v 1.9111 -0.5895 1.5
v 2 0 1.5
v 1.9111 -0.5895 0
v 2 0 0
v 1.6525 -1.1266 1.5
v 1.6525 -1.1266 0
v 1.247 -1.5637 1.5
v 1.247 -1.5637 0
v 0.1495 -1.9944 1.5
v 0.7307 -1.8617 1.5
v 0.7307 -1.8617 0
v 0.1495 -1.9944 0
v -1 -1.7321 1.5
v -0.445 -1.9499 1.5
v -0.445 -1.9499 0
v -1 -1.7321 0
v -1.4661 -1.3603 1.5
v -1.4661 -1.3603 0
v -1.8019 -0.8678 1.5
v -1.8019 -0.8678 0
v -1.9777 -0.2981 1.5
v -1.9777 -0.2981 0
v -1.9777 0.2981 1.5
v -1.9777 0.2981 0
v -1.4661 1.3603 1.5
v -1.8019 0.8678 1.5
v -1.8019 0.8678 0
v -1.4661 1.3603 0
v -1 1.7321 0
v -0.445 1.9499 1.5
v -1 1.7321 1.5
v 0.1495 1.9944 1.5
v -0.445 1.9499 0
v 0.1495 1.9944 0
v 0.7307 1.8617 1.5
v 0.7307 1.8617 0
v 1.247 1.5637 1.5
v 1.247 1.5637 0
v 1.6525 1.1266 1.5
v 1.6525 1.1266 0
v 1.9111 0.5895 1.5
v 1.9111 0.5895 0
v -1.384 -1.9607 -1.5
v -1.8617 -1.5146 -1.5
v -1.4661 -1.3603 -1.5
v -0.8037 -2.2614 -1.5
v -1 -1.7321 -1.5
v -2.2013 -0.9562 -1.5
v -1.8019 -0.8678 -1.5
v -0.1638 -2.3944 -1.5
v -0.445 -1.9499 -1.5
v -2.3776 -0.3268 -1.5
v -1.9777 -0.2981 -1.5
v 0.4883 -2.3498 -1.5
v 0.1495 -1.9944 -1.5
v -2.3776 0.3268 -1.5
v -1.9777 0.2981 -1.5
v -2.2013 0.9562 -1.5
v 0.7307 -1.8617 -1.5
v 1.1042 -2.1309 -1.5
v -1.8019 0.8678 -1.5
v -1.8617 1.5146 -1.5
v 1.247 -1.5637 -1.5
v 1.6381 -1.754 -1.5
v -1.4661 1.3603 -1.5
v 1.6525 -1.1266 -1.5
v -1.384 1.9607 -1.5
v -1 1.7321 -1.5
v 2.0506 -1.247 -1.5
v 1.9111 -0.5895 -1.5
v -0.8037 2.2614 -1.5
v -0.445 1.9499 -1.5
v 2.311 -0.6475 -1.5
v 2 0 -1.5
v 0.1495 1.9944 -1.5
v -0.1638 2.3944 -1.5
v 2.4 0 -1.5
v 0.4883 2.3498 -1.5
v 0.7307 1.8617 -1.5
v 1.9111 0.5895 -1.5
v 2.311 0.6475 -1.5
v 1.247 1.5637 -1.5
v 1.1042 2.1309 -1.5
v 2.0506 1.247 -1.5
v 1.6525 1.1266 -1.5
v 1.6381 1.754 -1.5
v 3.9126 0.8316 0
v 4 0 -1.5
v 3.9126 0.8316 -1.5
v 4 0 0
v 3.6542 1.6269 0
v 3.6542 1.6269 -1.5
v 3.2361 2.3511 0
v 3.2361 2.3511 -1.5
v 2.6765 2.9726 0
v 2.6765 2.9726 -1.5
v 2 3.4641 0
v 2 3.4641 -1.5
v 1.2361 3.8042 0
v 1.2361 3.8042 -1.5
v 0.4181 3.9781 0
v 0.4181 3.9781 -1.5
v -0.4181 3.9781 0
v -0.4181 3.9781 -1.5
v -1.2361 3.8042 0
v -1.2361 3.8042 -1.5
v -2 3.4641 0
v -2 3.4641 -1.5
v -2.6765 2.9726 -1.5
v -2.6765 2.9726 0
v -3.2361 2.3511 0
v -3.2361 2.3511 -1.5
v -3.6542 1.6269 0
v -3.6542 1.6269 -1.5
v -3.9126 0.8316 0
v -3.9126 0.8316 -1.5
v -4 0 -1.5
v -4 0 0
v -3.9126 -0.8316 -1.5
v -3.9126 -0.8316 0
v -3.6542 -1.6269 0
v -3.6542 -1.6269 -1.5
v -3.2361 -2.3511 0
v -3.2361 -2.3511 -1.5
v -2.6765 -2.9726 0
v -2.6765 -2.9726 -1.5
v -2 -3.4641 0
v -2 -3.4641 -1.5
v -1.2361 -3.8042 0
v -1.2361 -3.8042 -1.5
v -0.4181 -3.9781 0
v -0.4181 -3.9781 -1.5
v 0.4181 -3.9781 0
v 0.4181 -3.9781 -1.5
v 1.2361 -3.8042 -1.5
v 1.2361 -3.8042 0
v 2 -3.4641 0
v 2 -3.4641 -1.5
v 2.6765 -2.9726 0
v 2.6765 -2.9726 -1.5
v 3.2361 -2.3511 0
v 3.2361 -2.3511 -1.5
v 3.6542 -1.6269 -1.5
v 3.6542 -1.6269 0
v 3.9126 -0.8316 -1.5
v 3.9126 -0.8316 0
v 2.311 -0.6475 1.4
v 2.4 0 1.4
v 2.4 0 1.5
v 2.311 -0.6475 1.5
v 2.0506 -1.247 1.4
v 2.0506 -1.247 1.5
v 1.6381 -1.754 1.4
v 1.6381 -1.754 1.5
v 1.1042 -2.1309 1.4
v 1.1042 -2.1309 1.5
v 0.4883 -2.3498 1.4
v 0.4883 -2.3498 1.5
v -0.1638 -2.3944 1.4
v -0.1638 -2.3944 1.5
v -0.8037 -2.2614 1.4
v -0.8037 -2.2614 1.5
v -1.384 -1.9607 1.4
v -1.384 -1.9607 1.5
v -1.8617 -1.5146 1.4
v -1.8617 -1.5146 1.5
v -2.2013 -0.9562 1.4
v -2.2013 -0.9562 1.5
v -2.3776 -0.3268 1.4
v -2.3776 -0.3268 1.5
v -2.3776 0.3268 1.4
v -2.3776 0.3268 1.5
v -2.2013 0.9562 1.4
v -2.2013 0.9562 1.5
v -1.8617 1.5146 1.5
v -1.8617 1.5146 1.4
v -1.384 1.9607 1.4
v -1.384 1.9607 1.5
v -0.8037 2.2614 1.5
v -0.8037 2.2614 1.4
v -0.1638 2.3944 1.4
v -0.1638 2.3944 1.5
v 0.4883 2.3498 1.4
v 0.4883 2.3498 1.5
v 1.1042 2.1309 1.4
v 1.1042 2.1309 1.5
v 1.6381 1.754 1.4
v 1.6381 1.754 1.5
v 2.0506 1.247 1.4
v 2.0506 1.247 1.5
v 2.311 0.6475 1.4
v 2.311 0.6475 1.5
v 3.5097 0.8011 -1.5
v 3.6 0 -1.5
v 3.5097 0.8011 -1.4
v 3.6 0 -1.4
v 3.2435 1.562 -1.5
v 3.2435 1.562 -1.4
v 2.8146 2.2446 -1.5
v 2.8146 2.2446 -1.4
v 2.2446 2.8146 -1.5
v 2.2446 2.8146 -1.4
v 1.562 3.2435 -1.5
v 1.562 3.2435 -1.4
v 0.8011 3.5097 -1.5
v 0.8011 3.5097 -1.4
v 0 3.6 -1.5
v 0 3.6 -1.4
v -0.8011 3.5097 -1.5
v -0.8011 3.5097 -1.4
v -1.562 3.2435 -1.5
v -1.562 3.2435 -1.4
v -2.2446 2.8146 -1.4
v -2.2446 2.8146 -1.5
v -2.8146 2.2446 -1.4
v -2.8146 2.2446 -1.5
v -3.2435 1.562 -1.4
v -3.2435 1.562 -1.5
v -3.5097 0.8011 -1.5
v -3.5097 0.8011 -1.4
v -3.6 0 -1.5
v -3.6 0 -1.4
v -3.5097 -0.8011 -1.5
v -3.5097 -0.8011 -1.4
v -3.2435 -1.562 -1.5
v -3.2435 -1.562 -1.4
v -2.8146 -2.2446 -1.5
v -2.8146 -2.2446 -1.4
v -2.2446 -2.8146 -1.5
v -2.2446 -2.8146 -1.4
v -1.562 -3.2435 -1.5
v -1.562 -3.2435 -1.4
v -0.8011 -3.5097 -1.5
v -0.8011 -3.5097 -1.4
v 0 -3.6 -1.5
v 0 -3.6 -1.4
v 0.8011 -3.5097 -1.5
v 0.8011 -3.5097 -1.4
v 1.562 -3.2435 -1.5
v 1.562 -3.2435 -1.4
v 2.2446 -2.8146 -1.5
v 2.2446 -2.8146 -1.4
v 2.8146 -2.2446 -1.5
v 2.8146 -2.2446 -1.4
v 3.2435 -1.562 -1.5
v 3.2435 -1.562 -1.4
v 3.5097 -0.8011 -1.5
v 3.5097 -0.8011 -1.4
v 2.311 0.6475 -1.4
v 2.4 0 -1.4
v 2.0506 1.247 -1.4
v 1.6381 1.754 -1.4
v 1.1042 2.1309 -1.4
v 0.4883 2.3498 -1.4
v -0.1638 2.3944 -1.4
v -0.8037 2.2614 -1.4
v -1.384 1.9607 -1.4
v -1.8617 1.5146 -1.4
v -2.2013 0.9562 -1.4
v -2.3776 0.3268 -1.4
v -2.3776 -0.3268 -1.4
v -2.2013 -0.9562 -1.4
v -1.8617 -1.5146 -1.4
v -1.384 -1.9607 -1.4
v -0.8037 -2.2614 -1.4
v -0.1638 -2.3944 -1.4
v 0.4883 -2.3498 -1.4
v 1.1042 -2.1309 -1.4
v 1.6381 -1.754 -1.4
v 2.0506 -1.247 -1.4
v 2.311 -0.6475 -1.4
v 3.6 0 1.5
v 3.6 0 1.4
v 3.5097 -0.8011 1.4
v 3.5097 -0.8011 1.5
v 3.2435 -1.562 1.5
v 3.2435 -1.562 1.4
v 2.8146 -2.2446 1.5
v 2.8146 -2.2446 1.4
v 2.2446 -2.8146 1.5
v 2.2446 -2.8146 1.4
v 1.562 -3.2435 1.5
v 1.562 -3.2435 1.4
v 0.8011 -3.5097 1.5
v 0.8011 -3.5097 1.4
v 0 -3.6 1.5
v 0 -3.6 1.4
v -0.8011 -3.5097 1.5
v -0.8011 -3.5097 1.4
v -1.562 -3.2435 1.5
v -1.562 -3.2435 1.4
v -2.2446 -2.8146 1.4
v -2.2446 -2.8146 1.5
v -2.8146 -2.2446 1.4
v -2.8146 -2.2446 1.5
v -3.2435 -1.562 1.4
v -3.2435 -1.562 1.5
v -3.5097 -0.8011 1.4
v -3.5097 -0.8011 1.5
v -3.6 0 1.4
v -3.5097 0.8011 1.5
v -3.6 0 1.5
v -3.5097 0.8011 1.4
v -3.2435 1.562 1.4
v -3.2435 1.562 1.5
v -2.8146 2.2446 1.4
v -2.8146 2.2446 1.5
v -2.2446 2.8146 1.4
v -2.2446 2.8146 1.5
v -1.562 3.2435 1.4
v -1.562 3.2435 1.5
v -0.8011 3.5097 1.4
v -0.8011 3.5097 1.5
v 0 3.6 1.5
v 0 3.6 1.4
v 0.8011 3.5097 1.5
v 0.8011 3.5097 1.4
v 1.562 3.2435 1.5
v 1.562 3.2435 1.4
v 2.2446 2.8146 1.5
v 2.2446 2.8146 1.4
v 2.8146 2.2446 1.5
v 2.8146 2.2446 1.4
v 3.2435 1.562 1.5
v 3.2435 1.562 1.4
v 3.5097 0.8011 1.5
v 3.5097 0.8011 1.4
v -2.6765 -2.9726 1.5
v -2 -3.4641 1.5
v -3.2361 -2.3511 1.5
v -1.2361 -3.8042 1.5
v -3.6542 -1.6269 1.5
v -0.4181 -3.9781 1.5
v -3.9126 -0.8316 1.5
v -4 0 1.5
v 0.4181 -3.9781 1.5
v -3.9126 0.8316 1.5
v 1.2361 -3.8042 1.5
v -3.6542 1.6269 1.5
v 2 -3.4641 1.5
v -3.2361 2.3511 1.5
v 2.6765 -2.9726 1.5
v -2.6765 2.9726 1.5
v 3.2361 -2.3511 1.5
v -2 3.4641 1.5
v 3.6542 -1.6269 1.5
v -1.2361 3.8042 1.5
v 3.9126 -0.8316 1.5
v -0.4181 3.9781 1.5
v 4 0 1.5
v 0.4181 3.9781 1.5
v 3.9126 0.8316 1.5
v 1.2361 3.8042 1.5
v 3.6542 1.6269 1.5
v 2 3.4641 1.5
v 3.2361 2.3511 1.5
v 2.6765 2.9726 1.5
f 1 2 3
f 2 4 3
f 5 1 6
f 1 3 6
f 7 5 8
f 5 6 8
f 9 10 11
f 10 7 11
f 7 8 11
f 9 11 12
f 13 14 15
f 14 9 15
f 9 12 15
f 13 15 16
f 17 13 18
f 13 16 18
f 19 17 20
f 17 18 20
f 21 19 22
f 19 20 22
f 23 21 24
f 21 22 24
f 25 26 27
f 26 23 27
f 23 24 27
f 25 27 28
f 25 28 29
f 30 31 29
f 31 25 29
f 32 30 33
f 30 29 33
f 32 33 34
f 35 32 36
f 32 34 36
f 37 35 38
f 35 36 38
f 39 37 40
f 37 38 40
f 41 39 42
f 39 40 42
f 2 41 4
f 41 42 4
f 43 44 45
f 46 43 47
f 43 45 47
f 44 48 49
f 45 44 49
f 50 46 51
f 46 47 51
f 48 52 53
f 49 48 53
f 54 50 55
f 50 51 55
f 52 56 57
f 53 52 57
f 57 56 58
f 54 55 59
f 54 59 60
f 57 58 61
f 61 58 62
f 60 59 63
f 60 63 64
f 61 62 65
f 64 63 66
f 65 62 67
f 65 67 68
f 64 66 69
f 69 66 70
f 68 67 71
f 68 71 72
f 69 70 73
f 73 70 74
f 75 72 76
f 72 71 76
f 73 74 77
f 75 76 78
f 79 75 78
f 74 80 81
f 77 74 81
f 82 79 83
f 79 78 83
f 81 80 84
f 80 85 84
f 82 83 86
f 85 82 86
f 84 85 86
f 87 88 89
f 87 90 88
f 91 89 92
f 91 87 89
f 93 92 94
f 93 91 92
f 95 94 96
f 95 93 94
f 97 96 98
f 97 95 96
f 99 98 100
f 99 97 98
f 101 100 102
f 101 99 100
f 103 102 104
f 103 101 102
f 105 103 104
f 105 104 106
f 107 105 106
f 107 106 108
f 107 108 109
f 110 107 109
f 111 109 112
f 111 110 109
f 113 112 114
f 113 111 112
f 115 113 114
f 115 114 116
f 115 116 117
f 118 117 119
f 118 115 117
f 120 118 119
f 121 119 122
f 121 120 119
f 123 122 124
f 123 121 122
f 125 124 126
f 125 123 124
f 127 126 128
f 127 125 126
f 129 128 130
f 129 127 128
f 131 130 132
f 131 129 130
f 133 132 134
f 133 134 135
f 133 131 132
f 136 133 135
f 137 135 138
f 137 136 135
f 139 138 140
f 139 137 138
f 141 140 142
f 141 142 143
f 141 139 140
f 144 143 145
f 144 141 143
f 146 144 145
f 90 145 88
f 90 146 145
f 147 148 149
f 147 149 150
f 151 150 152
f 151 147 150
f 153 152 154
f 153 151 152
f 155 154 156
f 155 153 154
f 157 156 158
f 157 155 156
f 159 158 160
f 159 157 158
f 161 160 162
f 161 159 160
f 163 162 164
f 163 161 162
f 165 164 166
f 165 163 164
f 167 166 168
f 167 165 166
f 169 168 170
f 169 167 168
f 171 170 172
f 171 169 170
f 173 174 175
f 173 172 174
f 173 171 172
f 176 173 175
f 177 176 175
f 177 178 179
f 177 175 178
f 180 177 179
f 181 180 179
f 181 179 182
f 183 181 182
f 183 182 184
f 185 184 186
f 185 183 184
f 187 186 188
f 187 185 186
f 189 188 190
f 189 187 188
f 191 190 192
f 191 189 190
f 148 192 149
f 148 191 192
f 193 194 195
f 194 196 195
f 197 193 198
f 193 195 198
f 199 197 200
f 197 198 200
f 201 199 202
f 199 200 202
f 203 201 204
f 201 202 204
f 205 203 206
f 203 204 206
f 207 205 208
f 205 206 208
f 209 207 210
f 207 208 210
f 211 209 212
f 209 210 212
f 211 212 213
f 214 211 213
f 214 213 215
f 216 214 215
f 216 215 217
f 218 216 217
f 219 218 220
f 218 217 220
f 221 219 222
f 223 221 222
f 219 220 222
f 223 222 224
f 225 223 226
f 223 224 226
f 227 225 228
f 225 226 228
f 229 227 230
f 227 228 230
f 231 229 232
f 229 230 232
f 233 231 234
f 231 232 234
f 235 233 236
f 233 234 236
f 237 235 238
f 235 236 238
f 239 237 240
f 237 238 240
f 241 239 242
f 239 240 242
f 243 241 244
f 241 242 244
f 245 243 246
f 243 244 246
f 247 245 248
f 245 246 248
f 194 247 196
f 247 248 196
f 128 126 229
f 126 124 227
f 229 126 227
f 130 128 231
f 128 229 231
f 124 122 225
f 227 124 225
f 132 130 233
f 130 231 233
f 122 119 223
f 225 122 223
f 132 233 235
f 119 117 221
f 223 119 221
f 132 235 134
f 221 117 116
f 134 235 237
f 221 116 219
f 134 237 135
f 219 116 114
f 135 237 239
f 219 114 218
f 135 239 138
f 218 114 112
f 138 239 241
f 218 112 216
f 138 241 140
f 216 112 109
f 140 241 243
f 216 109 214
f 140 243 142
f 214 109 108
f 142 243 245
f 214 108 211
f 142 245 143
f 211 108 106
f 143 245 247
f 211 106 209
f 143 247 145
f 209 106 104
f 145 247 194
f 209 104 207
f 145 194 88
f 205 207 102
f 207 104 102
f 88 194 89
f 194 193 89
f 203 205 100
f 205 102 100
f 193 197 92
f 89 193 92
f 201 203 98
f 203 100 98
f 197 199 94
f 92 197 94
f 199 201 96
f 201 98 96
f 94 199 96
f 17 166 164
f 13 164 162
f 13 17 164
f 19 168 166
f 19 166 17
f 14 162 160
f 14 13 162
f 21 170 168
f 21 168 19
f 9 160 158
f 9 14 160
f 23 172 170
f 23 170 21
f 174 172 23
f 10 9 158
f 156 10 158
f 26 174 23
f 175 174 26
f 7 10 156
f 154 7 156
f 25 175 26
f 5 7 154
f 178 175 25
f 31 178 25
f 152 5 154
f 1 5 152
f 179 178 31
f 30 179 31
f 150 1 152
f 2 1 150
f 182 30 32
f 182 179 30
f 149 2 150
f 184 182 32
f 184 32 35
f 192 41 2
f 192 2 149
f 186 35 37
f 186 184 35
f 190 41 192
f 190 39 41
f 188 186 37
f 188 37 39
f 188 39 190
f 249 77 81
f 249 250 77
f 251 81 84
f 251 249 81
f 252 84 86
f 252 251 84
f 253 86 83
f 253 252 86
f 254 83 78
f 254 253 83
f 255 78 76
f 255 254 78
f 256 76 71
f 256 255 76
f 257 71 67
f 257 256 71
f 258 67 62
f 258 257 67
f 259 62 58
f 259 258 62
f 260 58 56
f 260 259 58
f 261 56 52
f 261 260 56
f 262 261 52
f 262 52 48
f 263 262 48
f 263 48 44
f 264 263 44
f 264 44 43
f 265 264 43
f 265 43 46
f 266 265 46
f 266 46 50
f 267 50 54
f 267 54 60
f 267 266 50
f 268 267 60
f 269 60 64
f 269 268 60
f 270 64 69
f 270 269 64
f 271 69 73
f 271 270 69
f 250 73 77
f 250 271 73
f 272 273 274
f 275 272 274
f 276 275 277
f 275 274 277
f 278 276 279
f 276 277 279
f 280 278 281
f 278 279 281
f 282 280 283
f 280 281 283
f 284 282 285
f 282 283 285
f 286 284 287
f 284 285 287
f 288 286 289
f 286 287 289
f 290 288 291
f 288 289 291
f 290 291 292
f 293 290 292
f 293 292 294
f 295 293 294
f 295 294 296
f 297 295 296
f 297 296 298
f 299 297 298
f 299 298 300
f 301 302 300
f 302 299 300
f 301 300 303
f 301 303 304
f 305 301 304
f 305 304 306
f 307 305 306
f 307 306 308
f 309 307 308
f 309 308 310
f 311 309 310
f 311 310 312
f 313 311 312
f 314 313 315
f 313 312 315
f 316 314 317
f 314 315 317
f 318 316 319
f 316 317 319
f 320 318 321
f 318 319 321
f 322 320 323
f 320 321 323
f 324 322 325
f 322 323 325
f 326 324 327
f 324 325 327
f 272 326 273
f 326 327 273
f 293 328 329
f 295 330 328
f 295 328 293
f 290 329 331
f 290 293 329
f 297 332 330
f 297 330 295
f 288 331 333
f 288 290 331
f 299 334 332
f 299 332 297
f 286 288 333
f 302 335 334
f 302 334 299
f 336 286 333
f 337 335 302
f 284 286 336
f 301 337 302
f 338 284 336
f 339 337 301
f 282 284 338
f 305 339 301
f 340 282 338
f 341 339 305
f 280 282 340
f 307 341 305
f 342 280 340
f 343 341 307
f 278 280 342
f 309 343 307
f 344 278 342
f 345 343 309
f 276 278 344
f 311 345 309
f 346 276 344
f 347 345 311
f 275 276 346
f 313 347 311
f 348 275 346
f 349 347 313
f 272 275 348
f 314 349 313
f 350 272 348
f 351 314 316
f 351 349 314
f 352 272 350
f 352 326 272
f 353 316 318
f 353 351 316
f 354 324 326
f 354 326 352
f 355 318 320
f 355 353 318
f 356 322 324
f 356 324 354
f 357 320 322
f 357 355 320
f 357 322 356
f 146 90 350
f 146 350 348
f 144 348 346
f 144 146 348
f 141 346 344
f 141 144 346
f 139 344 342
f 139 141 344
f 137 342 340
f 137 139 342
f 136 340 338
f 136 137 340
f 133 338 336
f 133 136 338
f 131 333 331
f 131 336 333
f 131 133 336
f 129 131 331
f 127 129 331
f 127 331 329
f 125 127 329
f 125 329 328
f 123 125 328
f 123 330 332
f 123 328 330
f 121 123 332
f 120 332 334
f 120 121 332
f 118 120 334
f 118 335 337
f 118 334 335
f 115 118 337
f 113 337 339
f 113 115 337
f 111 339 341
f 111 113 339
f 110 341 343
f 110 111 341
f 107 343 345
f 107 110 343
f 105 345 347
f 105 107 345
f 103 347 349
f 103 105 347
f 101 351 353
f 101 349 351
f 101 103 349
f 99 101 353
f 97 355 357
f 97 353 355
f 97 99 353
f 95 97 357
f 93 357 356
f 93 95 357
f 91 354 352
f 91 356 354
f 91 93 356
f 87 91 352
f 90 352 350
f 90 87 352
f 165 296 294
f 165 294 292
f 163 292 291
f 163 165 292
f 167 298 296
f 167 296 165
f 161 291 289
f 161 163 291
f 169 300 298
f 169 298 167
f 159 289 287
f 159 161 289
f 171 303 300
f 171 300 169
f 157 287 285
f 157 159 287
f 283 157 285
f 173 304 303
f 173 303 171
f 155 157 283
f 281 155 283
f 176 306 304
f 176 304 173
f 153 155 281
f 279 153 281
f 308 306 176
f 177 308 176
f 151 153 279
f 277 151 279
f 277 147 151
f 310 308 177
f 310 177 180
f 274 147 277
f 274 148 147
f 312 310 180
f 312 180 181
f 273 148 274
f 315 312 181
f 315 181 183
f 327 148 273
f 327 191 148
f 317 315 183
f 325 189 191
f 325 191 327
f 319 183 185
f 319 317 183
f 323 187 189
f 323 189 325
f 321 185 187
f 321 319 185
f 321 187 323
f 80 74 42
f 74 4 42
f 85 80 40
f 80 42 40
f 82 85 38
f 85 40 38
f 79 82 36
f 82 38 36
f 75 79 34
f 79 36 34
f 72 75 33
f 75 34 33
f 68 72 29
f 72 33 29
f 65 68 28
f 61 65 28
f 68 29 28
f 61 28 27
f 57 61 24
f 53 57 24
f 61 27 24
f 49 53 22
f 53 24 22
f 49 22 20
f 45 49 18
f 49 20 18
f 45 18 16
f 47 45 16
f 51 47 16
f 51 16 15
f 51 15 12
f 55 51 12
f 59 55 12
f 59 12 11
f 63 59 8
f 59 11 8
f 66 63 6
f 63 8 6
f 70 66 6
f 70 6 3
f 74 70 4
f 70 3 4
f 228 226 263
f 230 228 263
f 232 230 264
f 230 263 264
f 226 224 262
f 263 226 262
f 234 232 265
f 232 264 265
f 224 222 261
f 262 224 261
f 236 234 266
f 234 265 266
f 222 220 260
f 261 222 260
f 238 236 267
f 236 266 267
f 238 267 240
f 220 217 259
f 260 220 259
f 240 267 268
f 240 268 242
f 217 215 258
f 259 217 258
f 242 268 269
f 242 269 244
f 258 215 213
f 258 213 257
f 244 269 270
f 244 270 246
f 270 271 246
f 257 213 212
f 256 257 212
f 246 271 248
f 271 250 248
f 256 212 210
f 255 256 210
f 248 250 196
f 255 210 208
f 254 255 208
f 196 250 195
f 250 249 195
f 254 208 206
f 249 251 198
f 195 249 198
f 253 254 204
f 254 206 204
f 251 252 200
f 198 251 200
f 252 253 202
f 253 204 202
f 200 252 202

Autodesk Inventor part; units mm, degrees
ref_plane "YZ Plane" through (0, 0, 0) normal (1, 0, 0) x (0, 1, 0)
ref_plane "XZ Plane" through (0, 0, 0) normal (0, 1, 0) x (-1, 0, 0)
ref_plane "XY Plane" through (0, 0, 0) normal (0, 0, 1) x (1, 0, 0)
sketch "Skizze1" plane through (0, 0, 0) normal (0, 0, 1) x (1, 0, 0)
  circle A0 centre (0, 0) radius 2
  circle A1 centre (0, 0) radius 4
  circle A2 centre (0, 0) radius 2.4
  circle A3 centre (0, 0) radius 3.6
  dimension "d0" = 4
  dimension "d1" = 8
  dimension "d3" = 0.4
  dimension "d4" = 0.4
extrude "Extrusion1" add sketch "Skizze1" along normal mid plane 2.8 contours A3
extrude "Extrusion2" add sketch "Skizze1" along normal mid plane 3
properties part number "Kugellager 8 x 4 x 3"
